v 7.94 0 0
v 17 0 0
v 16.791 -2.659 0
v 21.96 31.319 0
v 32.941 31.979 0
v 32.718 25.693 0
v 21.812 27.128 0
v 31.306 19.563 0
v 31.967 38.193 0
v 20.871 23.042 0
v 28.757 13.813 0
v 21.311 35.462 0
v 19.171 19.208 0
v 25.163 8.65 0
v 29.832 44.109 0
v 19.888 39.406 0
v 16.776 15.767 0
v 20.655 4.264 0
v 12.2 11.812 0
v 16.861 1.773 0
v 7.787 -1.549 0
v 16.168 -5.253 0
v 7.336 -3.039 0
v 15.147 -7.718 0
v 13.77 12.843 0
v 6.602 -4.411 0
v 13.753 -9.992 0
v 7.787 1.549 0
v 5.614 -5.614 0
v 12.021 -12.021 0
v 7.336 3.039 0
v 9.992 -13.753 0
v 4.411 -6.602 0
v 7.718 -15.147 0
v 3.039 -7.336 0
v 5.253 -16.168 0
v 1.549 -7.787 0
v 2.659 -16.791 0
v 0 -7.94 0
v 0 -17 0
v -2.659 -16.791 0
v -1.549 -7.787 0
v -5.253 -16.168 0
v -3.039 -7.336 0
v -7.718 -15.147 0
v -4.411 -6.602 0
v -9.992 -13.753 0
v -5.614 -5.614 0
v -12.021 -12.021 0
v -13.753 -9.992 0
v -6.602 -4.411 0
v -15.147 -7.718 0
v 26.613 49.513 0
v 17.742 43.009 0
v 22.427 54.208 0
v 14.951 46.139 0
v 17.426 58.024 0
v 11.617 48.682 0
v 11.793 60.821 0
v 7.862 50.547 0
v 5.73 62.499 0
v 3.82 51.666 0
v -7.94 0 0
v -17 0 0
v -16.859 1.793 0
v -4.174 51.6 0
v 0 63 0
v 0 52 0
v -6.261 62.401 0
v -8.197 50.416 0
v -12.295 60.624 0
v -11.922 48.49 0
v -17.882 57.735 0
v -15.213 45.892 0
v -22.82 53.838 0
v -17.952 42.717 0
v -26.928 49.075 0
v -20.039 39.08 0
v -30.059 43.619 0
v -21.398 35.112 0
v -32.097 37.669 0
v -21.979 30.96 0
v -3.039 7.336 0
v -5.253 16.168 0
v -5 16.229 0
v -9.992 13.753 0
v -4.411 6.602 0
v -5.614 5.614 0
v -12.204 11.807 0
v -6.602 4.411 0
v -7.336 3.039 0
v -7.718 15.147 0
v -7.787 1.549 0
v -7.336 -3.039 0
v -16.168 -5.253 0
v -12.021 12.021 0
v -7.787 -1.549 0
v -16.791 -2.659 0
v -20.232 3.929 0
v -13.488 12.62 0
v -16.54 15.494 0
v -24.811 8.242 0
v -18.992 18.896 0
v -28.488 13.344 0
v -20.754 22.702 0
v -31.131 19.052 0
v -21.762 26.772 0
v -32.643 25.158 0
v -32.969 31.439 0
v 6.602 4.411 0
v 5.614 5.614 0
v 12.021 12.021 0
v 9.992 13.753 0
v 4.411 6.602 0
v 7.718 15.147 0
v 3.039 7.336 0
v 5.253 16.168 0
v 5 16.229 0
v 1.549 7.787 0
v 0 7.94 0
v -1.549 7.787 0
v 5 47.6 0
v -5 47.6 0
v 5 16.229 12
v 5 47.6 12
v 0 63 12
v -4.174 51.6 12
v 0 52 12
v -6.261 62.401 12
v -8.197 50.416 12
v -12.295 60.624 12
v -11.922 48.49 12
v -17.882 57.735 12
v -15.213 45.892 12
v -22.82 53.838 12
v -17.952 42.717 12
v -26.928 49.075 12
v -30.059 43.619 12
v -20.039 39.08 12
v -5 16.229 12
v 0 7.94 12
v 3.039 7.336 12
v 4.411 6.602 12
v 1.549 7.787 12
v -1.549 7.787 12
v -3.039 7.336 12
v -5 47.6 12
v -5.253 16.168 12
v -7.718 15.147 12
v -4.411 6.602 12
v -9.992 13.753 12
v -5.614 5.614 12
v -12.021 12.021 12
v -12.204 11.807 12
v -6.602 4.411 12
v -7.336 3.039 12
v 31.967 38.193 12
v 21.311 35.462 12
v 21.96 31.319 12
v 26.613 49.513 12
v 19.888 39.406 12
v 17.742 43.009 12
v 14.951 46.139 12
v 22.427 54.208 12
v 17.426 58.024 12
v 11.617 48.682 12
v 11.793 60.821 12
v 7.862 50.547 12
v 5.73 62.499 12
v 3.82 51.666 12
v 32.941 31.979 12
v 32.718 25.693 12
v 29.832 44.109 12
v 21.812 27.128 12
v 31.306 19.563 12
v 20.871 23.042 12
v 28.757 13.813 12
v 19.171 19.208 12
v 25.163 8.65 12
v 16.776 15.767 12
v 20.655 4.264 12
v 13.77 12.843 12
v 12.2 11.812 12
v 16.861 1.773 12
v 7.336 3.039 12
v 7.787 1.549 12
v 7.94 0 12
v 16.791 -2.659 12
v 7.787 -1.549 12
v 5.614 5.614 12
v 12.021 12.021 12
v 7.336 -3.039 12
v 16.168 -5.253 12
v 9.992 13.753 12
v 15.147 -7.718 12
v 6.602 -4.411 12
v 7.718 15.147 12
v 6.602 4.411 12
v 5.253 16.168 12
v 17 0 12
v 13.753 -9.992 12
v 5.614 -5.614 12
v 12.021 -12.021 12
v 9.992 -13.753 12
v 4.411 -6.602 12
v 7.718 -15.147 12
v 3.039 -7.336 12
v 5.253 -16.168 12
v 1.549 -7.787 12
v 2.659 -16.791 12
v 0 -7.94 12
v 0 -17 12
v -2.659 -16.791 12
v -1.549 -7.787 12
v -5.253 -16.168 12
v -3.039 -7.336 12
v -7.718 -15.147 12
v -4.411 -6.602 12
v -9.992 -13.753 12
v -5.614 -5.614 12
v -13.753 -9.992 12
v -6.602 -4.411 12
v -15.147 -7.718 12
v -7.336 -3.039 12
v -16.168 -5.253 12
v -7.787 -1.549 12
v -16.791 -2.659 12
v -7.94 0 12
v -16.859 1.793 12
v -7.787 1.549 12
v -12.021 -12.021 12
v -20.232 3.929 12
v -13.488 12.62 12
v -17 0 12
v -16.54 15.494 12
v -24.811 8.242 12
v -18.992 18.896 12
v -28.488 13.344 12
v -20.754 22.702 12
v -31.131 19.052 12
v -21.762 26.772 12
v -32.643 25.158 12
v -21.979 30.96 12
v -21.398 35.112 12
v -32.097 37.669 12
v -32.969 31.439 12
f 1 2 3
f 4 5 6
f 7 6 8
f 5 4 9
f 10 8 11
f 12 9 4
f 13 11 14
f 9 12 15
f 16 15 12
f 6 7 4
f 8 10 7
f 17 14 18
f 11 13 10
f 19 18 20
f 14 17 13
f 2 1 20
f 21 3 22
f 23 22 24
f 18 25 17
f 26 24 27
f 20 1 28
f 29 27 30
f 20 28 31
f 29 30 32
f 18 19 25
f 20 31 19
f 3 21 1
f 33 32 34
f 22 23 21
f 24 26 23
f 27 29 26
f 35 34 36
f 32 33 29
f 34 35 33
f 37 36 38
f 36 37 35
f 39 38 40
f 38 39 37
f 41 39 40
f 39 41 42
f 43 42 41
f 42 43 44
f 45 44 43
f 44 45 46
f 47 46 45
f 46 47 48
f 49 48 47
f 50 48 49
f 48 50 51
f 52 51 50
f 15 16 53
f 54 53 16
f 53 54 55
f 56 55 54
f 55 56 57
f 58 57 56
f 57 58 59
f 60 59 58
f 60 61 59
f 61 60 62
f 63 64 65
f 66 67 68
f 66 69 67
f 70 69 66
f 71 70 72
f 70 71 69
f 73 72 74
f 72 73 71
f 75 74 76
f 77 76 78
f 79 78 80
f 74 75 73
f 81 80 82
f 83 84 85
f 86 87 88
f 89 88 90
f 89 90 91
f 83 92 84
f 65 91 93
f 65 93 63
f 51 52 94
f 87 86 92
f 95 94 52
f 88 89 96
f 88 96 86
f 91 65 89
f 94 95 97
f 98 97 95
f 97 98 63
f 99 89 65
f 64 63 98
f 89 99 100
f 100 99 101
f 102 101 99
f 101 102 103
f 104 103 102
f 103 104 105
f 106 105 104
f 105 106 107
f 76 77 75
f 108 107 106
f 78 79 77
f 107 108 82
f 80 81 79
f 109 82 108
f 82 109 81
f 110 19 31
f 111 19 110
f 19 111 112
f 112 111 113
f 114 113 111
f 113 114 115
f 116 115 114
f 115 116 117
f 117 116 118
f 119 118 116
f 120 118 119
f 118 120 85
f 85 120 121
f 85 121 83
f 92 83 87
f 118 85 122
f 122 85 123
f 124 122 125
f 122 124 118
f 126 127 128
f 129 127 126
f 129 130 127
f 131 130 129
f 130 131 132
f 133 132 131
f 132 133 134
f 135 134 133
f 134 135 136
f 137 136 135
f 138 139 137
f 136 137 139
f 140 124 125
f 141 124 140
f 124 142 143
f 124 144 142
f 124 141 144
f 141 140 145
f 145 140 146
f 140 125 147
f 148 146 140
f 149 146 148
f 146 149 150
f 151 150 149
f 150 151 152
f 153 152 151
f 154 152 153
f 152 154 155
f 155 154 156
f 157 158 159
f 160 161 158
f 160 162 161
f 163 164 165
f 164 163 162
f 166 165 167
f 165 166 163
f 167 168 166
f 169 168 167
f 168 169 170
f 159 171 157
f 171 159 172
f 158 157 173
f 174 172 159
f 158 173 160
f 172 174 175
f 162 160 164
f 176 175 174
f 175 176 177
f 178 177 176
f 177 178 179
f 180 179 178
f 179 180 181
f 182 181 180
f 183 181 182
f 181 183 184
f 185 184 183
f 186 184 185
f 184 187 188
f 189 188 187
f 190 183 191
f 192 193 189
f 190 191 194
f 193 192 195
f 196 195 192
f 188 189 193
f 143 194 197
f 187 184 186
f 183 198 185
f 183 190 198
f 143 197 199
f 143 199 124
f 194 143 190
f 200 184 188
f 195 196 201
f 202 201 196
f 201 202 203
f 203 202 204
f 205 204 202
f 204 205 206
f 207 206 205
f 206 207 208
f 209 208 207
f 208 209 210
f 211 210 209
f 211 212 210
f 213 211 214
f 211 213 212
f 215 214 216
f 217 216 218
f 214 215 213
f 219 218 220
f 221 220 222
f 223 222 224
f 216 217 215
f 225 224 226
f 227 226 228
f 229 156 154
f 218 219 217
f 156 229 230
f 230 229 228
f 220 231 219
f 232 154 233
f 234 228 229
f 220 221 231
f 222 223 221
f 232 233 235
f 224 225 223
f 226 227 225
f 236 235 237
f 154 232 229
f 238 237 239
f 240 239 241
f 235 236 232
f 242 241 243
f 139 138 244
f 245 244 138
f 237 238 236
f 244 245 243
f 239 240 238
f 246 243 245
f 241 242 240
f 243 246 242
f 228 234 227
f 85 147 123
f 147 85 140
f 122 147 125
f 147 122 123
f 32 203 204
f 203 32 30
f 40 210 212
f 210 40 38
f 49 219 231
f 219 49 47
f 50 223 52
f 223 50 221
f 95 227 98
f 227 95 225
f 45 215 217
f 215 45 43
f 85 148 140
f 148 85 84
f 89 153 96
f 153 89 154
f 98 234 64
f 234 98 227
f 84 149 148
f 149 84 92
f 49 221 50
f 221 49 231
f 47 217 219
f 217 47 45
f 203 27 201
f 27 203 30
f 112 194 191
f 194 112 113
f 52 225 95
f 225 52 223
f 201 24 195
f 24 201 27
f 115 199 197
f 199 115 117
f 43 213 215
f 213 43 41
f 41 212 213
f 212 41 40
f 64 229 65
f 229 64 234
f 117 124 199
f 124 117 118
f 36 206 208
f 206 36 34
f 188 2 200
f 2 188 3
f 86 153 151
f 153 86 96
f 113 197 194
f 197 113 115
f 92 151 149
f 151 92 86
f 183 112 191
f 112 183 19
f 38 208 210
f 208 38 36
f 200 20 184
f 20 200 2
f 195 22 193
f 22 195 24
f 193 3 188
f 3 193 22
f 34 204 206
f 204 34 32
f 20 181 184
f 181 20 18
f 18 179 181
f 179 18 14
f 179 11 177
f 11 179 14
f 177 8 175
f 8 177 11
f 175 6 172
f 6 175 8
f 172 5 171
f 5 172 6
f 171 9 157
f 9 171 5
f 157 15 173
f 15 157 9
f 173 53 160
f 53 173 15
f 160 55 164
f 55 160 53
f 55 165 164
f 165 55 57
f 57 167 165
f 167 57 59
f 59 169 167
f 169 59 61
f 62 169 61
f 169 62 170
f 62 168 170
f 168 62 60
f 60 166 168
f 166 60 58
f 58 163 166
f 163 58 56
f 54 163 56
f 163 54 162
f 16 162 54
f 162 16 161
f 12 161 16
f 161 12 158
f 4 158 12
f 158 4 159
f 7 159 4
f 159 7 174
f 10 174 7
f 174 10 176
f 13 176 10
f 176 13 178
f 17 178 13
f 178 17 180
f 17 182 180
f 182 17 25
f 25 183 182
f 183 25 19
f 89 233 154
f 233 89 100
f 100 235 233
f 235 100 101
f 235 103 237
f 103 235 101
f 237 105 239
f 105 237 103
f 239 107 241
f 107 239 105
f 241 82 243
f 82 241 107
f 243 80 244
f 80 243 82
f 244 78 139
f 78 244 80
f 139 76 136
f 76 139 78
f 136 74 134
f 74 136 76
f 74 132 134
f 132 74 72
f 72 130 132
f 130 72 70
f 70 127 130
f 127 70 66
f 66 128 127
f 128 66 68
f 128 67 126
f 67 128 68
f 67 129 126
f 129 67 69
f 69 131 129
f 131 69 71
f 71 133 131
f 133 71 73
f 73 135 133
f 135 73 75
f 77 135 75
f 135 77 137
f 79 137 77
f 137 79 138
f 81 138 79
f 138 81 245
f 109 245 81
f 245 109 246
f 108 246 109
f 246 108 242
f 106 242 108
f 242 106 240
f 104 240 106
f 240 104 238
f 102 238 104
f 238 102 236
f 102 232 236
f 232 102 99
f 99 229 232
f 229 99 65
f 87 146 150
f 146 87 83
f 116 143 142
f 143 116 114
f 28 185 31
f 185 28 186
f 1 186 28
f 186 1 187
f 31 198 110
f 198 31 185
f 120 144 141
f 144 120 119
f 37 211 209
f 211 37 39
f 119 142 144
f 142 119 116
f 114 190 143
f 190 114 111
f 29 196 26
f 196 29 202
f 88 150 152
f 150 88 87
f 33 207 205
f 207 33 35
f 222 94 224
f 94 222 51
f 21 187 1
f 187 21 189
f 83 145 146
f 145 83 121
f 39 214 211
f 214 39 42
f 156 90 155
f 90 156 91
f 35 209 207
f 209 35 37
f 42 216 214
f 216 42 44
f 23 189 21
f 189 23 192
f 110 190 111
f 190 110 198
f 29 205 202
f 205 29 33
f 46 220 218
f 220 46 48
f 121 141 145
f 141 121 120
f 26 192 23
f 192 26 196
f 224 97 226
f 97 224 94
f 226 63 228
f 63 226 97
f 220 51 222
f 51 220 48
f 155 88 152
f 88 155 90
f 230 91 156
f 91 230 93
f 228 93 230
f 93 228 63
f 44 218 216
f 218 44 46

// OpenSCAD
$fn = 32;

// ----------------------------------------------------------------------
// Hook: 60 mm shank into a 22 mm curl, 12 mm thick
// ----------------------------------------------------------------------

// --- parameters (mm) ---
shank_len = 60;           // shank length from the boss centre
shank_w = 10;             // shank width
boss_d = 34;              // boss diameter
bore_d = 15.88;           // boss bore
curl_in = 22;             // curl inner radius
curl_out = 33;            // curl outer radius
curl_sweep = 350;         // curl sweep angle
hook_t = 12;              // hook thickness

shank_profile = [[-5, 47.6], [5, 47.6], [5, 15], [-5, 15]];
boss_profile = [[17, 0], [16.791, 2.659], [16.168, 5.253], [15.147, 7.718], [13.753, 9.992], [12.021, 12.021], [9.992, 13.753], [7.718, 15.147], [5.253, 16.168], [2.659, 16.791], [0, 17], [-2.659, 16.791], [-5.253, 16.168], [-7.718, 15.147], [-9.992, 13.753], [-12.021, 12.021], [-13.753, 9.992], [-15.147, 7.718], [-16.168, 5.253], [-16.791, 2.659], [-17, 0], [-16.791, -2.659], [-16.168, -5.253], [-15.147, -7.718], [-13.753, -9.992], [-12.021, -12.021], [-9.992, -13.753], [-7.718, -15.147], [-5.253, -16.168], [-2.659, -16.791], [0, -17], [2.659, -16.791], [5.253, -16.168], [7.718, -15.147], [9.992, -13.753], [12.021, -12.021], [13.753, -9.992], [15.147, -7.718], [16.168, -5.253], [16.791, -2.659]];
curl_profile = [[0, 63], [-6.261, 62.401], [-12.295, 60.624], [-17.882, 57.735], [-22.82, 53.838], [-26.928, 49.075], [-30.059, 43.619], [-32.097, 37.669], [-32.969, 31.439], [-32.643, 25.158], [-31.131, 19.052], [-28.488, 13.344], [-24.811, 8.242], [-20.232, 3.929], [-14.918, 0.564], [-9.061, -1.732], [-2.876, -2.874], [3.414, -2.823], [9.579, -1.579], [15.397, 0.812], [20.655, 4.264], [25.163, 8.65], [28.757, 13.813], [31.306, 19.563], [32.718, 25.693], [32.941, 31.979], [31.967, 38.193], [29.832, 44.109], [26.613, 49.513], [22.427, 54.208], [17.426, 58.024], [11.793, 60.821], [5.73, 62.499], [3.82, 51.666], [7.862, 50.547], [11.617, 48.682], [14.951, 46.139], [17.742, 43.009], [19.888, 39.406], [21.311, 35.462], [21.96, 31.319], [21.812, 27.128], [20.871, 23.042], [19.171, 19.208], [16.776, 15.767], [13.77, 12.843], [10.265, 10.541], [6.386, 8.947], [2.276, 8.118], [-1.917, 8.084], [-6.041, 8.846], [-9.945, 10.376], [-13.488, 12.62], [-16.54, 15.494], [-18.992, 18.896], [-20.754, 22.702], [-21.762, 26.772], [-21.979, 30.96], [-21.398, 35.112], [-20.039, 39.08], [-17.952, 42.717], [-15.213, 45.892], [-11.922, 48.49], [-8.197, 50.416], [-4.174, 51.6], [0, 52]];

difference() {
  union() {
    /* three overlapping outlines: shank, boss and the smooth curl */
    linear_extrude(height = hook_t) polygon(shank_profile);
    linear_extrude(height = hook_t) polygon(boss_profile);
    linear_extrude(height = hook_t) polygon(curl_profile);
  }
  translate([0, 0, -2.5]) cylinder(h = hook_t + 5, d = bore_d);
}
